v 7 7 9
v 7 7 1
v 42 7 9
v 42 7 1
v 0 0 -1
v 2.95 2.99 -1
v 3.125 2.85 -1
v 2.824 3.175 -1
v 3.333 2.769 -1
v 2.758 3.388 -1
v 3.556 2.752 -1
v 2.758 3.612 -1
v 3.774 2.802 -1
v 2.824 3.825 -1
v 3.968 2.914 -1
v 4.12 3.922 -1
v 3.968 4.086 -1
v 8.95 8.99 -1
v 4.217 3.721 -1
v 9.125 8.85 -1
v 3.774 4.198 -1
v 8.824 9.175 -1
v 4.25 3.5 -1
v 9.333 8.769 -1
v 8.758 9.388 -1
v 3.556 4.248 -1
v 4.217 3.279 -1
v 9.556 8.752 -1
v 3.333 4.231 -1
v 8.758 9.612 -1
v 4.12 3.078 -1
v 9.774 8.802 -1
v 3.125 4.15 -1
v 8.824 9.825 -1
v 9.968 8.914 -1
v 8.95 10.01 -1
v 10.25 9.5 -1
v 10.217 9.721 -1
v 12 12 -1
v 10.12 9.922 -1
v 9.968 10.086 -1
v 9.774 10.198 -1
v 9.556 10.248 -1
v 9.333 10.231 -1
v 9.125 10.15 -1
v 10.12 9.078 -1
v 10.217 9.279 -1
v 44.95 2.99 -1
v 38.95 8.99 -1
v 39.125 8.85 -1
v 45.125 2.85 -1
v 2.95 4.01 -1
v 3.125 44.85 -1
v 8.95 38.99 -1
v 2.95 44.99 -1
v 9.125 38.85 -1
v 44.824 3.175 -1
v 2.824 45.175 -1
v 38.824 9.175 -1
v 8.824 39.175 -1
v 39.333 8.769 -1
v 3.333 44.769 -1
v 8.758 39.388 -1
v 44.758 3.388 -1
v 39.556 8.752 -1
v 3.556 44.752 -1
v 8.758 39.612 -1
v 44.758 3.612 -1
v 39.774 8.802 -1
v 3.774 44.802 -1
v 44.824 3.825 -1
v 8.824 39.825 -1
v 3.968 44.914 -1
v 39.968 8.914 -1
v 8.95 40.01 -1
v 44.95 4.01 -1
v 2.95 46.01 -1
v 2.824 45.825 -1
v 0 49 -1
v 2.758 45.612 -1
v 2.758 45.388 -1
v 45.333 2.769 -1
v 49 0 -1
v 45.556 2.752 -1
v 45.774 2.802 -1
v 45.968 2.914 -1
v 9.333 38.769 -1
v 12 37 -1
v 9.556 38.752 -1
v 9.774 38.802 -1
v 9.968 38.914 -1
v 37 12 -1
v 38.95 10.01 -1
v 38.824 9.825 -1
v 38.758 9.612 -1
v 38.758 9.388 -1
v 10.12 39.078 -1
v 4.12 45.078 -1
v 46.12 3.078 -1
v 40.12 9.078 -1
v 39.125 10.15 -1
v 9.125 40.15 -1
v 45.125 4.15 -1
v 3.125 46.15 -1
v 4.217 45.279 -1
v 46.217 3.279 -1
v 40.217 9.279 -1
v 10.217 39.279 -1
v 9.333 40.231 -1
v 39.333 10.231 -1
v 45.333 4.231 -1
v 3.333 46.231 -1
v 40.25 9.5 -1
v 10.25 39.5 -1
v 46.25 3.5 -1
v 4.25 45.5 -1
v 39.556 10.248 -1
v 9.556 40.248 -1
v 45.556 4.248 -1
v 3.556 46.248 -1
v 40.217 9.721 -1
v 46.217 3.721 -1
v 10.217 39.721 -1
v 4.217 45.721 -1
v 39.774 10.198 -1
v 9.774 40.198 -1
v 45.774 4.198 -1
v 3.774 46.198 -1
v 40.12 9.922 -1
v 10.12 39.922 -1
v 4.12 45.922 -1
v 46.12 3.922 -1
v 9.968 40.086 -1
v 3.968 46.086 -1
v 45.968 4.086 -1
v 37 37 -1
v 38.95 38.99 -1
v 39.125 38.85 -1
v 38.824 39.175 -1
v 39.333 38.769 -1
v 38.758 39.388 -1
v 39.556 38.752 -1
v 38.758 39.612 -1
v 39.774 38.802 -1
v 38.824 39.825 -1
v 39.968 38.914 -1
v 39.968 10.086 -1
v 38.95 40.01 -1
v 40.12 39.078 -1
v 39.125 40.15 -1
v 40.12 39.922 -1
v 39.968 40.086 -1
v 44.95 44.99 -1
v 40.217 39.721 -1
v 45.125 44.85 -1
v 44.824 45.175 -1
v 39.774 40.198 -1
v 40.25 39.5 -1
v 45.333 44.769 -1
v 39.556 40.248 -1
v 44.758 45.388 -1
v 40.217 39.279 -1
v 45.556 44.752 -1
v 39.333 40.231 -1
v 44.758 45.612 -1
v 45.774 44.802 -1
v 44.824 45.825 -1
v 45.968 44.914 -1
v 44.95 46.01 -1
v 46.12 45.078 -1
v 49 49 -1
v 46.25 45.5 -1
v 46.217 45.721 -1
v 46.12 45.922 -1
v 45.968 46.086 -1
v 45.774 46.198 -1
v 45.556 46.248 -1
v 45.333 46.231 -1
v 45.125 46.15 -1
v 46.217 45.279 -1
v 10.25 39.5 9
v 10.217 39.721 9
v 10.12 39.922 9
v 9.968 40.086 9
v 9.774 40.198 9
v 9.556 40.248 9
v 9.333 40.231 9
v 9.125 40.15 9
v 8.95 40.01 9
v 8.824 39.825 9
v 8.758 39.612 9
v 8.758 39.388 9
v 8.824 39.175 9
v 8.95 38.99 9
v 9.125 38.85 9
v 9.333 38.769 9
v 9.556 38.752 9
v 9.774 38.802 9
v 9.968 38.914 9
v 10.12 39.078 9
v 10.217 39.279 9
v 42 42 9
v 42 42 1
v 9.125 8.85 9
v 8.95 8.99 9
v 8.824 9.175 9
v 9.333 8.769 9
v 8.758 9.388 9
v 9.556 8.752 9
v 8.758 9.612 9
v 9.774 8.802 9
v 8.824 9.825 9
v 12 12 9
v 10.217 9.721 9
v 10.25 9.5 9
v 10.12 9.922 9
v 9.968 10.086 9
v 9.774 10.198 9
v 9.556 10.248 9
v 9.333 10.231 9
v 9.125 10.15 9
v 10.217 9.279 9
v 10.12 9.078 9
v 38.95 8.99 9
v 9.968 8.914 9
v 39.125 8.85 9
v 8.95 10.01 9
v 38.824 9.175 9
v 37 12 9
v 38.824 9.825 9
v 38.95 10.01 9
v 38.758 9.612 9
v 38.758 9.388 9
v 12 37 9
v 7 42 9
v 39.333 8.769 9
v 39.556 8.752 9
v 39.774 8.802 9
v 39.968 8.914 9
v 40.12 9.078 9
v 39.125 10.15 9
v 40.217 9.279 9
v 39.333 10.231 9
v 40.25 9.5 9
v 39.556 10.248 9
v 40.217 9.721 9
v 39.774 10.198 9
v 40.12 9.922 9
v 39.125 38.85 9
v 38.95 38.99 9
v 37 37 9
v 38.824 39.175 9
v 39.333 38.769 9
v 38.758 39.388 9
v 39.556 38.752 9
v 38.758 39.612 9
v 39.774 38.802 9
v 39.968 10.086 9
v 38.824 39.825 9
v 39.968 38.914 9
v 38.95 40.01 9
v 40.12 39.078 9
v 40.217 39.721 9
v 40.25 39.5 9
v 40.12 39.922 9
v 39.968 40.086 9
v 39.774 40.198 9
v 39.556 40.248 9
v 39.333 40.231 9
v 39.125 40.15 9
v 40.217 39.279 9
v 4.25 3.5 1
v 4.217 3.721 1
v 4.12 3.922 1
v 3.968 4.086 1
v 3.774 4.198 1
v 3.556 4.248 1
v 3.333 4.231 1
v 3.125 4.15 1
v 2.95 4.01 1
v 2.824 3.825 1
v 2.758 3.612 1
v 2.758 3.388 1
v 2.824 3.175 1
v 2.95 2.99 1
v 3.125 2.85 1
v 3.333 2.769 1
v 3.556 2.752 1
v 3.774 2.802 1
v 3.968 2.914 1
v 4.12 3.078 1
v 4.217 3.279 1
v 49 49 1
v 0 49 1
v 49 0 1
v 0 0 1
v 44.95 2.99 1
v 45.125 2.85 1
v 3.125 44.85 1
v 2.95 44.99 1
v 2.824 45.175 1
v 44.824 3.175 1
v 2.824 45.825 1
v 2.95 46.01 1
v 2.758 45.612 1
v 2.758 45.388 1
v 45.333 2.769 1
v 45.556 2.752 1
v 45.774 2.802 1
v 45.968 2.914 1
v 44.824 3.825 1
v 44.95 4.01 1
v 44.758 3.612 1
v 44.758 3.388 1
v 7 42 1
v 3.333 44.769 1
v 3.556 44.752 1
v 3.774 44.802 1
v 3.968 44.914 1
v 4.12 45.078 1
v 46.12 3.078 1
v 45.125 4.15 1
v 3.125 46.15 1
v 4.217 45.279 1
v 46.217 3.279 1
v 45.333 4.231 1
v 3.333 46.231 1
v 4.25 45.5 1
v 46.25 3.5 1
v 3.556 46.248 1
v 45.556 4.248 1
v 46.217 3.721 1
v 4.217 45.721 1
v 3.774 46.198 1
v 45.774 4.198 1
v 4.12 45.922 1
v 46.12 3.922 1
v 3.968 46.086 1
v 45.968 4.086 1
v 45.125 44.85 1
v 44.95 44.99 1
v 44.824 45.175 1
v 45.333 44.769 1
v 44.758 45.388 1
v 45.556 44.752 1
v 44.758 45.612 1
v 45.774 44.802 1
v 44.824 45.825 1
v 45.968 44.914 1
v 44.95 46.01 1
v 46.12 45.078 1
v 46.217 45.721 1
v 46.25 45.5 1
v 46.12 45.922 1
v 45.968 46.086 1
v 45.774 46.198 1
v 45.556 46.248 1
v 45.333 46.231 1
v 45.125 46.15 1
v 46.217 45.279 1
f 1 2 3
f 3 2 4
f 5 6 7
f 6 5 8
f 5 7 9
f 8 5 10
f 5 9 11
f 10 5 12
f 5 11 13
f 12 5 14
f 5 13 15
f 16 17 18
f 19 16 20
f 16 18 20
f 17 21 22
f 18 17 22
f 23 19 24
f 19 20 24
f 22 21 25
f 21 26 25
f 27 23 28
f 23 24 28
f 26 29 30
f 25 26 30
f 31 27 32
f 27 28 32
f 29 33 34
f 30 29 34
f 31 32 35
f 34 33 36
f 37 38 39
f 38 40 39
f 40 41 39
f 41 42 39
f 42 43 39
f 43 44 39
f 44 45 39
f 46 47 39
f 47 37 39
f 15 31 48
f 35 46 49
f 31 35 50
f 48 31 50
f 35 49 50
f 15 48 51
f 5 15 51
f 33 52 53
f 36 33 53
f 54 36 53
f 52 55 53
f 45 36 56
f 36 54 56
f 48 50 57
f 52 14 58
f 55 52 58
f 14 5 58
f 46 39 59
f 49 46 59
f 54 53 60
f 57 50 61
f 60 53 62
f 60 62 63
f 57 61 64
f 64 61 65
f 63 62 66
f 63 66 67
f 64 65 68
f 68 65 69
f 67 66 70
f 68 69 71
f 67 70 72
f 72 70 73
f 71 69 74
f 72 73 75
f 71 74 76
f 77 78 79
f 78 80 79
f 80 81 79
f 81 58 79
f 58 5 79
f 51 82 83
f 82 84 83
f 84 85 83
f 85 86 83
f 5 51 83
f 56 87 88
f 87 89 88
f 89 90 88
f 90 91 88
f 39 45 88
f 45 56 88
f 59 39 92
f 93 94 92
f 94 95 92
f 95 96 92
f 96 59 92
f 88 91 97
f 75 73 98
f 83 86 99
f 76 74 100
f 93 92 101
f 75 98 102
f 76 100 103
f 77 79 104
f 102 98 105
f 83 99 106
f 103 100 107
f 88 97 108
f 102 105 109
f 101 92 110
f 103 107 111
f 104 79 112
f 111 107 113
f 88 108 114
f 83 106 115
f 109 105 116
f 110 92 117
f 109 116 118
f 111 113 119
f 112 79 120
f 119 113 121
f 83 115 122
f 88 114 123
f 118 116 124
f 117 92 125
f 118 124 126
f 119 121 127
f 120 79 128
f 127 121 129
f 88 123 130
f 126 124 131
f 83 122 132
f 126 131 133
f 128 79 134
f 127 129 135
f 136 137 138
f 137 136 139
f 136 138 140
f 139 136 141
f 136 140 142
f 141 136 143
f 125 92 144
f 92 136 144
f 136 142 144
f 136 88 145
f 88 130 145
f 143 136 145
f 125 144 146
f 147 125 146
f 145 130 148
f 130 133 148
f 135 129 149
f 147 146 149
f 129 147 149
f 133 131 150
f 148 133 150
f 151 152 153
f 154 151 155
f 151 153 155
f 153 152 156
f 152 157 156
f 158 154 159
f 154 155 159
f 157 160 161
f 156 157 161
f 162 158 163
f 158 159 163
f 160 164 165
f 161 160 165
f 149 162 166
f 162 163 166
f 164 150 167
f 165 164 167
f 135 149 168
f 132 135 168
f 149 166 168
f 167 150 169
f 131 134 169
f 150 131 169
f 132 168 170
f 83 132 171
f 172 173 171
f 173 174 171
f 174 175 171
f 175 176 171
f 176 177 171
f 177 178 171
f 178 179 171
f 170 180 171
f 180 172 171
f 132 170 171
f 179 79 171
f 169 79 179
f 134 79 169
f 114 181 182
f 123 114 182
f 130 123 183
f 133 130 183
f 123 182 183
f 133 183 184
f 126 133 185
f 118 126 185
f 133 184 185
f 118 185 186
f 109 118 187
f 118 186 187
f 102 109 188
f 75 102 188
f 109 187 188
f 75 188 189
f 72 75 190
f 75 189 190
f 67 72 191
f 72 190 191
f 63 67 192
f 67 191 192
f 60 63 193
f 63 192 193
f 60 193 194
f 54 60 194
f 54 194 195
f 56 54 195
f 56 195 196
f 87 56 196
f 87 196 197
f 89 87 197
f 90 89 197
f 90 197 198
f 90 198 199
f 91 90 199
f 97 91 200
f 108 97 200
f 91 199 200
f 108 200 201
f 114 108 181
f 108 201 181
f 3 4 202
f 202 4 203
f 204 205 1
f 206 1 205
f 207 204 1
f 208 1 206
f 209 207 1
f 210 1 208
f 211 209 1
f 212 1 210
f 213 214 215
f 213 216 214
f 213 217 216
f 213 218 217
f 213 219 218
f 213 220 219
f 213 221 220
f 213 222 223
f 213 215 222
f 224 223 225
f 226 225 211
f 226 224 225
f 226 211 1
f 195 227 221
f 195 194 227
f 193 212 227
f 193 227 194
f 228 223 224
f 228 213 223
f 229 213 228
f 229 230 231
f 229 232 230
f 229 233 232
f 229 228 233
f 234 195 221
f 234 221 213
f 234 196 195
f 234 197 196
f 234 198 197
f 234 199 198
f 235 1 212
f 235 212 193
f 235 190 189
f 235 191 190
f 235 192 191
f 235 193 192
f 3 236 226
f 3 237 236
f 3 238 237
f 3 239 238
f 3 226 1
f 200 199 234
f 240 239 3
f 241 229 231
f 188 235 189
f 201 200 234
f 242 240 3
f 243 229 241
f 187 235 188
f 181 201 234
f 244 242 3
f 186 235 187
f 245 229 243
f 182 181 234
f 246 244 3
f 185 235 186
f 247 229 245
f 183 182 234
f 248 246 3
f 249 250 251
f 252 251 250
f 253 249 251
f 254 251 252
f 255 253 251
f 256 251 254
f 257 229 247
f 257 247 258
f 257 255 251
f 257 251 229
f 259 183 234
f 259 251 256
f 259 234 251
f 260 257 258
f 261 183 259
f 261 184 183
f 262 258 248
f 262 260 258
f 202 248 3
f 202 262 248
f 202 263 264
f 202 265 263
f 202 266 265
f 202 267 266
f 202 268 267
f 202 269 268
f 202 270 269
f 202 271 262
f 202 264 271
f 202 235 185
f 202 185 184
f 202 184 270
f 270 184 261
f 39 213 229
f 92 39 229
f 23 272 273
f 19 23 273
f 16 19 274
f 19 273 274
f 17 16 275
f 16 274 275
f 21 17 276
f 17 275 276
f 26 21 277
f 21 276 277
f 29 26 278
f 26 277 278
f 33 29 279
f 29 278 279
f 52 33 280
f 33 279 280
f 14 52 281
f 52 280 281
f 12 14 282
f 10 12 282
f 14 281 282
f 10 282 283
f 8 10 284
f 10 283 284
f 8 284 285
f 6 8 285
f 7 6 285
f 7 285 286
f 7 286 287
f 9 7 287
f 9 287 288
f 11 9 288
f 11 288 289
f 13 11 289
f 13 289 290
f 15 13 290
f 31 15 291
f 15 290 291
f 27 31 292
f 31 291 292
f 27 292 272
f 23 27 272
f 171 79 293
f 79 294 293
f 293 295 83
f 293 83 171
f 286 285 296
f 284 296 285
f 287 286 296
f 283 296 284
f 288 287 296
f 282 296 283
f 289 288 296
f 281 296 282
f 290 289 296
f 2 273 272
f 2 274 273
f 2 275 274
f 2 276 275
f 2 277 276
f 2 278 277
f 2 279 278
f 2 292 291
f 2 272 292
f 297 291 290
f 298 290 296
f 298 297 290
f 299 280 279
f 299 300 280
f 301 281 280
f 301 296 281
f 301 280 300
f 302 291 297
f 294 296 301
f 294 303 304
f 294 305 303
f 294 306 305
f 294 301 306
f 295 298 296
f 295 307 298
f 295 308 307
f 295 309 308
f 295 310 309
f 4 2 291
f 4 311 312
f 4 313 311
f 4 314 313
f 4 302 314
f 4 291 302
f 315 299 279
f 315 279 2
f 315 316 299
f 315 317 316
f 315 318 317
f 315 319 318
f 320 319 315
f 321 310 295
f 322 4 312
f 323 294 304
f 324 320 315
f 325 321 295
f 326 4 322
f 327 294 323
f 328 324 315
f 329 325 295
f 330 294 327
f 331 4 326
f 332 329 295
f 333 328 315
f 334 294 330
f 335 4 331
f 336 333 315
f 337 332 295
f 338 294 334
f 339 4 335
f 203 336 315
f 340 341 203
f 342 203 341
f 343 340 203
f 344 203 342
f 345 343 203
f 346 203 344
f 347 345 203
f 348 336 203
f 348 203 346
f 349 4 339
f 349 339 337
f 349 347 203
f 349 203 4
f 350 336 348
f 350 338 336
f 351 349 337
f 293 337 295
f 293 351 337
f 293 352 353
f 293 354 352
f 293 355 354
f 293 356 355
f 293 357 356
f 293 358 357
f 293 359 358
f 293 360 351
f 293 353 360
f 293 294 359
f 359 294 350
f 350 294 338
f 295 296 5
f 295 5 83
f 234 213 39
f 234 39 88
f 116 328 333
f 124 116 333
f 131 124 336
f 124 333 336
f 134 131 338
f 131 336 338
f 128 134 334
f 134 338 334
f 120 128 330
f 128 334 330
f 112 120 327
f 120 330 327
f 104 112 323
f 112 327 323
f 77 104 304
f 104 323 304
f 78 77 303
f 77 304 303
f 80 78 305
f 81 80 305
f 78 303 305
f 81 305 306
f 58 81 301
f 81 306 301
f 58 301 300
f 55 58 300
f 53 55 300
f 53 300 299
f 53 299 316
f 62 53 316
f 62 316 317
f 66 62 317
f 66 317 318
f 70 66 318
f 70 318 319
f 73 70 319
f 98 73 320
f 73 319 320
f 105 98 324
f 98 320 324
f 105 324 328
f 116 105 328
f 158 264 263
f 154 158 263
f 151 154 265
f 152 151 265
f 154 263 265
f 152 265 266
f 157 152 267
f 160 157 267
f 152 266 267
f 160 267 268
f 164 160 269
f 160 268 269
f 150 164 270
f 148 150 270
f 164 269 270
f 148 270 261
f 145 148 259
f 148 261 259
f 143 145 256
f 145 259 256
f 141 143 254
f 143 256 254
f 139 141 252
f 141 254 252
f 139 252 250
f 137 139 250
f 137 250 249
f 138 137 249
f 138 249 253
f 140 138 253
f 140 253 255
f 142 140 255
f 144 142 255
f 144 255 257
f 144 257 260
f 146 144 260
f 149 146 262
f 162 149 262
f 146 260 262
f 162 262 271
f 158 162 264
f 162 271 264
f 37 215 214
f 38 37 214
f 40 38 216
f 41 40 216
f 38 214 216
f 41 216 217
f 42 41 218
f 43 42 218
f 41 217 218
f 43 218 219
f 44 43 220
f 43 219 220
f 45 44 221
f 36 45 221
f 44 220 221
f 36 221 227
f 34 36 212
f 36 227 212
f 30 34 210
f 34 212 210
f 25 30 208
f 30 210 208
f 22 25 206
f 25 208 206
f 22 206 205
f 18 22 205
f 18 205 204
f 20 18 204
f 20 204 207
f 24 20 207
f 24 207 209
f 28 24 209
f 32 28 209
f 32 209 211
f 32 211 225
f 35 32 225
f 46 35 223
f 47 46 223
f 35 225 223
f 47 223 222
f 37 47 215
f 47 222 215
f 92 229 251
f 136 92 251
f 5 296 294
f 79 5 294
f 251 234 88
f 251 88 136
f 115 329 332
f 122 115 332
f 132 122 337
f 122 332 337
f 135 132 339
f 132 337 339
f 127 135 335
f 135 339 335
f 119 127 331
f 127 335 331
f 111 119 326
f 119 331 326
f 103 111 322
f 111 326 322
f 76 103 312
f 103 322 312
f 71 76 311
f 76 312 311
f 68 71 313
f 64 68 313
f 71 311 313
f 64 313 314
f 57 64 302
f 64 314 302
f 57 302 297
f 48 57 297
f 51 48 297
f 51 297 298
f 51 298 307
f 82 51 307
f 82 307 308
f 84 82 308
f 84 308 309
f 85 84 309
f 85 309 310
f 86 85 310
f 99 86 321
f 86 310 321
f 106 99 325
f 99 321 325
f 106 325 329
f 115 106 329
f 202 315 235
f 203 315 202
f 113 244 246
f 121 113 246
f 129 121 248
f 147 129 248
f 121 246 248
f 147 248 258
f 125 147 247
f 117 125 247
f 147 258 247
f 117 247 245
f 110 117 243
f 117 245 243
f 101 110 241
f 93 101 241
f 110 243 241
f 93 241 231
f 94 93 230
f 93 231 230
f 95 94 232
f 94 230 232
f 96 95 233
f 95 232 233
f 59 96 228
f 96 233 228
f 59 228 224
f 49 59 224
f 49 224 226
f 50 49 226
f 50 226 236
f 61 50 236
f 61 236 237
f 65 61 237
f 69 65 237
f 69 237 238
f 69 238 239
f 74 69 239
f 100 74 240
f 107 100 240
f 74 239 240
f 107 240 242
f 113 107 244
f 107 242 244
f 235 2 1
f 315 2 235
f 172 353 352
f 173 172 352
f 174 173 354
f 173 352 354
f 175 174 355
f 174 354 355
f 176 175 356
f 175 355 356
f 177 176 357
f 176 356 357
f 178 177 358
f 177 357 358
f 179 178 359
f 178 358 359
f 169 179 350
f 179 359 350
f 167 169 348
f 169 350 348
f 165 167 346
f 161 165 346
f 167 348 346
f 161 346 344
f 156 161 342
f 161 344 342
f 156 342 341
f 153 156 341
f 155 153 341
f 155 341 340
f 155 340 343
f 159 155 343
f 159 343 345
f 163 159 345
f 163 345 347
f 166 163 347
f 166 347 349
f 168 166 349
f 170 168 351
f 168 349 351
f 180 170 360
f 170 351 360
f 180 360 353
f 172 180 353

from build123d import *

# Parameters (mm, degrees)
SKETCH001_W     = 49
SKETCH001_H     = 49
PAD_DEPTH       = 1
SKETCH002_W     = 35
SKETCH002_H     = 35
PAD001_DEPTH    = 8
SKETCH003_W     = 25
SKETCH003_H     = 25
POCKET_DEPTH    = 10
SKETCH004_R     = 0.75
POCKET001_DEPTH = 2
SKETCH005_R     = 0.75
POCKET002_DEPTH = 10


with BuildPart() as part:
    # Sketch001 → Pad (new body, symmetric)
    with BuildSketch(Plane.XY):
        with Locations((24.5, 24.5)):
            Rectangle(SKETCH001_W, SKETCH001_H)
    extrude(amount=PAD_DEPTH, both=True)

    # Sketch002 (on Face6 of Pad) → Pad001 (join)
    with BuildSketch(Plane.XY.offset(1)):
        with Locations((24.5, 24.5)):
            Rectangle(SKETCH002_W, SKETCH002_H)
    extrude(amount=PAD001_DEPTH)

    # Sketch003 (on Face11 of Pad001) → Pocket (cut)
    with BuildSketch(Plane.XY.offset(9)):
        with Locations((24.5, 24.5)):
            Rectangle(SKETCH003_W, SKETCH003_H)
    extrude(amount=-POCKET_DEPTH, mode=Mode.SUBTRACT)

    # Sketch004 (on Face5 of Pocket) → Pocket001 (cut)
    with BuildSketch(Plane.XY.offset(1)):
        with Locations((3.5, 3.5)):
            Circle(SKETCH004_R)
        with Locations((3.5, 45.5)):
            Circle(SKETCH004_R)
        with Locations((45.5, 3.5)):
            Circle(SKETCH004_R)
        with Locations((45.5, 45.5)):
            Circle(SKETCH004_R)
    extrude(amount=-POCKET001_DEPTH, mode=Mode.SUBTRACT)

    # Sketch005 (on Face19 of Pocket001) → Pocket002 (cut)
    with BuildSketch(Plane.XY.offset(9)):
        with Locations((9.5, 39.5)):
            Circle(SKETCH005_R)
        with Locations((39.5, 39.5)):
            Circle(SKETCH005_R)
        with Locations((39.5, 9.5)):
            Circle(SKETCH005_R)
        with Locations((9.5, 9.5)):
            Circle(SKETCH005_R)
    extrude(amount=-POCKET002_DEPTH, mode=Mode.SUBTRACT)


solid = part.part
